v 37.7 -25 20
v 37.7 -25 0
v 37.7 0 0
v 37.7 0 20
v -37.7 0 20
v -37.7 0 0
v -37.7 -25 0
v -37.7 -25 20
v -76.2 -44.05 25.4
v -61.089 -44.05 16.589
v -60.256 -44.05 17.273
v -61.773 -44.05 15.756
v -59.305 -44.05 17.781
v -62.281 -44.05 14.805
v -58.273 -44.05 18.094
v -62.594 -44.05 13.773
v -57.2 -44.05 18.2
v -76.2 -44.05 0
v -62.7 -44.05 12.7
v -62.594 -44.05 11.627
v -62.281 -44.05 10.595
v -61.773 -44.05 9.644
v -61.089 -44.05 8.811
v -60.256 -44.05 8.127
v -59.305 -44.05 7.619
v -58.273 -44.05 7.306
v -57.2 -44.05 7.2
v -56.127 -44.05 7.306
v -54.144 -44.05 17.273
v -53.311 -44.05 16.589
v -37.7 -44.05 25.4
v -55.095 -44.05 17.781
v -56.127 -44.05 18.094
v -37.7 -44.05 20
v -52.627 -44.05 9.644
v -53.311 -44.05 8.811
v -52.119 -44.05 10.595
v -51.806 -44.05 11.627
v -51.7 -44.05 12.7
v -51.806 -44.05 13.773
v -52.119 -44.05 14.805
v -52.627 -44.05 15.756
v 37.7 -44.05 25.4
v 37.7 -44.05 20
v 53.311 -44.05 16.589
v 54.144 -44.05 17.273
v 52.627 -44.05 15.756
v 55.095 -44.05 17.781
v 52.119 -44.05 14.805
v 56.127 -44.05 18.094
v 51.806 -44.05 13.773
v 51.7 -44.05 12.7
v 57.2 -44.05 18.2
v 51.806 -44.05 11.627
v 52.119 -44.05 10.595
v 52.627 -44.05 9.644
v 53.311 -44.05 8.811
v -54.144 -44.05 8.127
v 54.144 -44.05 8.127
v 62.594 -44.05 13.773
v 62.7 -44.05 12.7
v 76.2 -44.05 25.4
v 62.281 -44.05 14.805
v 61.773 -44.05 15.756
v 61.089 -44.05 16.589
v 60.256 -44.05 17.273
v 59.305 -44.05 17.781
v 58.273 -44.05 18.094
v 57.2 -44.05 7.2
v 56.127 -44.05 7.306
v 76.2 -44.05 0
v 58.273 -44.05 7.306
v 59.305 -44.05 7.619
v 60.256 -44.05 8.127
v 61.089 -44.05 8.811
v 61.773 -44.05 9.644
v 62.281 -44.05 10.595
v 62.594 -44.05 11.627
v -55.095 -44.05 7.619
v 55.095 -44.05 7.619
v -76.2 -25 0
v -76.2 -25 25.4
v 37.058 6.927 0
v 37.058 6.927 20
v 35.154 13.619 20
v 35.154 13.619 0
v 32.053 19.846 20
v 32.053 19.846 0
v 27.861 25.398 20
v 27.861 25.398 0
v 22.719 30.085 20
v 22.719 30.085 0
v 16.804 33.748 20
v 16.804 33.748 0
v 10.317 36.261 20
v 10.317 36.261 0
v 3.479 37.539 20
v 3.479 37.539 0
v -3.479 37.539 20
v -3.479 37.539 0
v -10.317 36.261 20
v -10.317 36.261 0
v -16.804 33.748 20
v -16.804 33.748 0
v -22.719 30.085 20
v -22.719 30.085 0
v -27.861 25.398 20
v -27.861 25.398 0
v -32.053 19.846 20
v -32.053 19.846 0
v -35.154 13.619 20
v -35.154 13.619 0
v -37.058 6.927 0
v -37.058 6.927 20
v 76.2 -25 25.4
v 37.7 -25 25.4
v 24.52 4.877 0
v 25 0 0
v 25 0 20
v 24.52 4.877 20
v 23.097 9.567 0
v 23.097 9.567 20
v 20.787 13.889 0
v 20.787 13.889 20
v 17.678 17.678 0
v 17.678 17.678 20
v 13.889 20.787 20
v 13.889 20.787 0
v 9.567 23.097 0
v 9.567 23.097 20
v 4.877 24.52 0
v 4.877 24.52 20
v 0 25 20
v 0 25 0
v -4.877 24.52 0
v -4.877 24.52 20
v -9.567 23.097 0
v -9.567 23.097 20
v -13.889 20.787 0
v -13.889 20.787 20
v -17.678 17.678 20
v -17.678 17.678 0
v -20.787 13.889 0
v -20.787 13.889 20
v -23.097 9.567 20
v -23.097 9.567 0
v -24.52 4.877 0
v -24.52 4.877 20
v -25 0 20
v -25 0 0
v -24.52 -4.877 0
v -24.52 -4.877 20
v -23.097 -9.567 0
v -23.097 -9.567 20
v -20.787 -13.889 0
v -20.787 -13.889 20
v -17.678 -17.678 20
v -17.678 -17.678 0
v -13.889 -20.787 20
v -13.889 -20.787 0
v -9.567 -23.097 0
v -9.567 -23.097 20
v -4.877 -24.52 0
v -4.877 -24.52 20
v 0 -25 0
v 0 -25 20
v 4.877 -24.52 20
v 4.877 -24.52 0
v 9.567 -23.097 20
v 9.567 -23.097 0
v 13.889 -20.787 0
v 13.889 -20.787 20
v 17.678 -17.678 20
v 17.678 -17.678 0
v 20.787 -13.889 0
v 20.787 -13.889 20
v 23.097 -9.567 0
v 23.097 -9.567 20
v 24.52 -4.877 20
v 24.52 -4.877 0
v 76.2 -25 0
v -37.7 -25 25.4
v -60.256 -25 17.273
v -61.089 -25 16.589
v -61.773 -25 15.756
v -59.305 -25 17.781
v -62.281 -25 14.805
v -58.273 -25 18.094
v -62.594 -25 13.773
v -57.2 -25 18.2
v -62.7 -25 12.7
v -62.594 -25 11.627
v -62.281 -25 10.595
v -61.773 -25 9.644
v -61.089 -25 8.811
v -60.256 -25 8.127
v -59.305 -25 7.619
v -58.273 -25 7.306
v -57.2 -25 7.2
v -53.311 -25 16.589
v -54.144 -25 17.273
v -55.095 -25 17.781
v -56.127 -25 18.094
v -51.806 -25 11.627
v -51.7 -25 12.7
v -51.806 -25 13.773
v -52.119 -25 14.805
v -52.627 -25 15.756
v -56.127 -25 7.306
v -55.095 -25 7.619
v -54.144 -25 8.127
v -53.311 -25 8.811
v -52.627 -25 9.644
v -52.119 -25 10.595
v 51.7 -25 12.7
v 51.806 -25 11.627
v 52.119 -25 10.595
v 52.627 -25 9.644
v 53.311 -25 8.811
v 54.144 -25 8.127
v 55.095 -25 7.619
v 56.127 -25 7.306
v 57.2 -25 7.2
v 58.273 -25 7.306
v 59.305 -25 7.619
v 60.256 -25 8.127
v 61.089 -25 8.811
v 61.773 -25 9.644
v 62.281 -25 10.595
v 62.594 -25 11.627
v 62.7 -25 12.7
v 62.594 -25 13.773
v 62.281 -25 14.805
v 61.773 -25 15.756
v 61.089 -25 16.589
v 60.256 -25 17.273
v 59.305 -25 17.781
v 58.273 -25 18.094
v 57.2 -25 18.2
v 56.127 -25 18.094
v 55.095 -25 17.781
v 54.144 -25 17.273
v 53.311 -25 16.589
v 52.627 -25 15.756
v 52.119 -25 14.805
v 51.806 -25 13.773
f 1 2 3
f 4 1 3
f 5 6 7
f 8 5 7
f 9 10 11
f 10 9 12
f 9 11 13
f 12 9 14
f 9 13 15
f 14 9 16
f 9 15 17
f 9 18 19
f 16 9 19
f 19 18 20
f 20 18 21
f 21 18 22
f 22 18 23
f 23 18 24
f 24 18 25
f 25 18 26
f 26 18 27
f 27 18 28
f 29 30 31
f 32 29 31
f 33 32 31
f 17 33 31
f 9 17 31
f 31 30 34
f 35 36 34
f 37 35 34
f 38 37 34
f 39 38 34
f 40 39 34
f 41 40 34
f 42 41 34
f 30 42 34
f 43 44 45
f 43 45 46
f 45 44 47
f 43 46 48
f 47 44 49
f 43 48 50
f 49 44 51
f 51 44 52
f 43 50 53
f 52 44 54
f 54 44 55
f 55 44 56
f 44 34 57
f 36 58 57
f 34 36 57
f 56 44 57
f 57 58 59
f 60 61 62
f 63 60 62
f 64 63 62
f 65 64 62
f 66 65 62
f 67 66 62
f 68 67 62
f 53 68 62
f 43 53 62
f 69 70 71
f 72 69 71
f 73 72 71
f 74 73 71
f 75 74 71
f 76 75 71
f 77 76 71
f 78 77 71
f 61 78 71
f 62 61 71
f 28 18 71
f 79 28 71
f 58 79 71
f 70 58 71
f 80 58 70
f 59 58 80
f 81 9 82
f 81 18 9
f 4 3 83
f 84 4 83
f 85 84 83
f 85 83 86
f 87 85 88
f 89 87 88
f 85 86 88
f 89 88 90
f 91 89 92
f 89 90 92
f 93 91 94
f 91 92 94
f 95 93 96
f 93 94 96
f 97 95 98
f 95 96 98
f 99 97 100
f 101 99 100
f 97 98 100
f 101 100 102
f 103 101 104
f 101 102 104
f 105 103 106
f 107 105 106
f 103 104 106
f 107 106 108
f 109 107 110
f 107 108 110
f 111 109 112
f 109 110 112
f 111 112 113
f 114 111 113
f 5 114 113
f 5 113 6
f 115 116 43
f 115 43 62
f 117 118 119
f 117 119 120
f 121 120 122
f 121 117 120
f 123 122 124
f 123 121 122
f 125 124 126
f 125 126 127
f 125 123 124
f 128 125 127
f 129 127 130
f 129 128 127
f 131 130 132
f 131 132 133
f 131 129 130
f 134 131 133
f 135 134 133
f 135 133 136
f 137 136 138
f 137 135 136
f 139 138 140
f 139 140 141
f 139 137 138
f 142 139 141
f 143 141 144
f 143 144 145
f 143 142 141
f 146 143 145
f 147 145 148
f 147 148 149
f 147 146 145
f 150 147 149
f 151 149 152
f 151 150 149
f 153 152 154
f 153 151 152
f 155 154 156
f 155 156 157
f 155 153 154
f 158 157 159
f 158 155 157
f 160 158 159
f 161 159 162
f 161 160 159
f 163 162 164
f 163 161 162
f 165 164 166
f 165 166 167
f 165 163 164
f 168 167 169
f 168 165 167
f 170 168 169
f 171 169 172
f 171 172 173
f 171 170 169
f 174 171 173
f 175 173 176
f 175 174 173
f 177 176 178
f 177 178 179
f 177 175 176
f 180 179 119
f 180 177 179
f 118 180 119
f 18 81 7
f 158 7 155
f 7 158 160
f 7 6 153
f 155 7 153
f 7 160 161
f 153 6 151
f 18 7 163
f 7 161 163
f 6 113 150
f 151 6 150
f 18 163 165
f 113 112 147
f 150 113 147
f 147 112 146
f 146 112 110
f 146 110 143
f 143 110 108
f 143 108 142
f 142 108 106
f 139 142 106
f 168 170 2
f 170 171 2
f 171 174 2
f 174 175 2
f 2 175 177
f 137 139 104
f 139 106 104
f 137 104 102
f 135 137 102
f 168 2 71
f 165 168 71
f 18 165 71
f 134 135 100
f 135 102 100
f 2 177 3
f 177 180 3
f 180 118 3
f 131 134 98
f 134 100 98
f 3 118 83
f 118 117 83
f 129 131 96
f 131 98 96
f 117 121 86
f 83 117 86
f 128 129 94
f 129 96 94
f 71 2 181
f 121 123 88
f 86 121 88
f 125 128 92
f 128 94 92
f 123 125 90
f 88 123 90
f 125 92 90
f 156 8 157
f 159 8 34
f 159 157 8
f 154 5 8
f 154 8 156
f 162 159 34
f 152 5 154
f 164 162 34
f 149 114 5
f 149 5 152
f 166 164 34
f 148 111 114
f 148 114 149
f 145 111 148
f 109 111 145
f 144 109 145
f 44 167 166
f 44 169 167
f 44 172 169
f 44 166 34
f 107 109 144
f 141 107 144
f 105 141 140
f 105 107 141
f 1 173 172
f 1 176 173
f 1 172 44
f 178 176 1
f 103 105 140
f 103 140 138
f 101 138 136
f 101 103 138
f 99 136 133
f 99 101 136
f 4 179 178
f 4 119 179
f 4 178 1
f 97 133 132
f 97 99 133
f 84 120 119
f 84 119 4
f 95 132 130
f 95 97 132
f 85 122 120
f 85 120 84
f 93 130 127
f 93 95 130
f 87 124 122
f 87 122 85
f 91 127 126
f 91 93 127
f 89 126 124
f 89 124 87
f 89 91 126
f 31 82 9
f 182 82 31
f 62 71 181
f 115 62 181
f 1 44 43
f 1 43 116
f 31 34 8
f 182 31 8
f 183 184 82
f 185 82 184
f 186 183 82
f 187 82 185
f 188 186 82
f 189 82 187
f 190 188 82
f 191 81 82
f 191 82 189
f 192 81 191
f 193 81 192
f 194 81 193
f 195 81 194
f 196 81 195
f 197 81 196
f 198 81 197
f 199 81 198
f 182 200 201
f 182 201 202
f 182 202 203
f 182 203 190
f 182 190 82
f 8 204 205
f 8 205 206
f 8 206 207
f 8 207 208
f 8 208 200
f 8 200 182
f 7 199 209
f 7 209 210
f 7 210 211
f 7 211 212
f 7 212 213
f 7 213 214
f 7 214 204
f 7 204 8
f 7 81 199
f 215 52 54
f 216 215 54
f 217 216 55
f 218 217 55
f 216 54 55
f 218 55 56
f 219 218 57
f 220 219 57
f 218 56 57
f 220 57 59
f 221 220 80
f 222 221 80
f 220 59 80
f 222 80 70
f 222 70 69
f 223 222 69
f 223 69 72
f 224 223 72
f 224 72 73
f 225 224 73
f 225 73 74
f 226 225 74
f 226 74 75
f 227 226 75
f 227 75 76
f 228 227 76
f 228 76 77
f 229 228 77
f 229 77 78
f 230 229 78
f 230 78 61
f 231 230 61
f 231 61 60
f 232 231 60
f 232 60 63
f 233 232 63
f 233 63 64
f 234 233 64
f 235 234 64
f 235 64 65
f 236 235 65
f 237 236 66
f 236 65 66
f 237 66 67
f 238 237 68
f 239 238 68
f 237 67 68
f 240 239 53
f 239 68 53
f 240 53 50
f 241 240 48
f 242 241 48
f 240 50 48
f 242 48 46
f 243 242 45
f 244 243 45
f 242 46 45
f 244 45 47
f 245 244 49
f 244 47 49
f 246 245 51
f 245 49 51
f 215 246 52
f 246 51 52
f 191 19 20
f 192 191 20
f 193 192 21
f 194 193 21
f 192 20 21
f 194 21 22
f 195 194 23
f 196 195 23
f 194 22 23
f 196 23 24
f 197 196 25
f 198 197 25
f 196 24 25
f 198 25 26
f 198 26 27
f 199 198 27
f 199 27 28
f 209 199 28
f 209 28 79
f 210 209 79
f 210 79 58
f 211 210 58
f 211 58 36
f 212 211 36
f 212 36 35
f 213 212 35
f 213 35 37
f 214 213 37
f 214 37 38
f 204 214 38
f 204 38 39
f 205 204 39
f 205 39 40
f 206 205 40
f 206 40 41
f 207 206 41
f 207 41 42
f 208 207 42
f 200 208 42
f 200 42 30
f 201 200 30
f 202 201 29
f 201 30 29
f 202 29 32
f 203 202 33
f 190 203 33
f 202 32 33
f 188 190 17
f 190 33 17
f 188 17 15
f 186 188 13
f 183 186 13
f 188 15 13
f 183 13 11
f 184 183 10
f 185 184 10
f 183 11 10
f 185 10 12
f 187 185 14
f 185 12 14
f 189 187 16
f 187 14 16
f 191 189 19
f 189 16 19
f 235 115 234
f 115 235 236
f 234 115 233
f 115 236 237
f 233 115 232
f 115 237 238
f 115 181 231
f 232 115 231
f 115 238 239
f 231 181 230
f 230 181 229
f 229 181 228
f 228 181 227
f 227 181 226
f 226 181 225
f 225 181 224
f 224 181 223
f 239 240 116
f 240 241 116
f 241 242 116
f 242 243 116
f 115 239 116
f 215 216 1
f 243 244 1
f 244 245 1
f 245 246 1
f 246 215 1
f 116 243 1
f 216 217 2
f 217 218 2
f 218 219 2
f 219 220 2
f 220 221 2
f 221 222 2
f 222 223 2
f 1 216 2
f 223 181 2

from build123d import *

# Parameters (mm, degrees)
SKETCH1_R             = 25
BOSS_EXTRUDE1_DEPTH   = 20
SKETCH2_W             = 38.5
SKETCH2_H             = 19.05
BOSS_EXTRUDE2_DEPTH   = 5.4
M10_CLEARANCE_HOLE1_D = 11


with BuildPart() as part:
    # Sketch1 → Boss-Extrude1 (new body)
    with BuildSketch(Plane.XY):
        with BuildLine():
            Line((-76.2, -25), (-76.2, -44.05))
            Line((-76.2, -44.05), (76.2, -44.05))
            Line((76.2, -44.05), (76.2, -25))
            Line((76.2, -25), (37.7, -25))
            Line((37.7, -25), (37.7, 0))
            ThreePointArc((37.7, 0), (0, 37.7), (-37.7, 0))
            Line((-37.7, 0), (-37.7, -25))
            Line((-37.7, -25), (-76.2, -25))
        make_face()
        Circle(SKETCH1_R, mode=Mode.SUBTRACT)
    extrude(amount=BOSS_EXTRUDE1_DEPTH)

    # Sketch2 → Boss-Extrude2 (add)
    with BuildSketch(Plane.XY.offset(20)):
        with Locations((-56.95, -34.525)):
            Rectangle(SKETCH2_W, SKETCH2_H)
        with Locations((56.95, -34.525)):
            Rectangle(SKETCH2_W, SKETCH2_H)
    extrude(amount=BOSS_EXTRUDE2_DEPTH)

    # M10 Clearance Hole1 (through all)
    with Locations(Plane(origin=(0, -25, 0), x_dir=(1, 0, 0), z_dir=(0, 1, 0))):
        with Locations((-57.2, -12.7), (57.2, -12.7)):
            Hole(M10_CLEARANCE_HOLE1_D / 2)


solid = part.part
